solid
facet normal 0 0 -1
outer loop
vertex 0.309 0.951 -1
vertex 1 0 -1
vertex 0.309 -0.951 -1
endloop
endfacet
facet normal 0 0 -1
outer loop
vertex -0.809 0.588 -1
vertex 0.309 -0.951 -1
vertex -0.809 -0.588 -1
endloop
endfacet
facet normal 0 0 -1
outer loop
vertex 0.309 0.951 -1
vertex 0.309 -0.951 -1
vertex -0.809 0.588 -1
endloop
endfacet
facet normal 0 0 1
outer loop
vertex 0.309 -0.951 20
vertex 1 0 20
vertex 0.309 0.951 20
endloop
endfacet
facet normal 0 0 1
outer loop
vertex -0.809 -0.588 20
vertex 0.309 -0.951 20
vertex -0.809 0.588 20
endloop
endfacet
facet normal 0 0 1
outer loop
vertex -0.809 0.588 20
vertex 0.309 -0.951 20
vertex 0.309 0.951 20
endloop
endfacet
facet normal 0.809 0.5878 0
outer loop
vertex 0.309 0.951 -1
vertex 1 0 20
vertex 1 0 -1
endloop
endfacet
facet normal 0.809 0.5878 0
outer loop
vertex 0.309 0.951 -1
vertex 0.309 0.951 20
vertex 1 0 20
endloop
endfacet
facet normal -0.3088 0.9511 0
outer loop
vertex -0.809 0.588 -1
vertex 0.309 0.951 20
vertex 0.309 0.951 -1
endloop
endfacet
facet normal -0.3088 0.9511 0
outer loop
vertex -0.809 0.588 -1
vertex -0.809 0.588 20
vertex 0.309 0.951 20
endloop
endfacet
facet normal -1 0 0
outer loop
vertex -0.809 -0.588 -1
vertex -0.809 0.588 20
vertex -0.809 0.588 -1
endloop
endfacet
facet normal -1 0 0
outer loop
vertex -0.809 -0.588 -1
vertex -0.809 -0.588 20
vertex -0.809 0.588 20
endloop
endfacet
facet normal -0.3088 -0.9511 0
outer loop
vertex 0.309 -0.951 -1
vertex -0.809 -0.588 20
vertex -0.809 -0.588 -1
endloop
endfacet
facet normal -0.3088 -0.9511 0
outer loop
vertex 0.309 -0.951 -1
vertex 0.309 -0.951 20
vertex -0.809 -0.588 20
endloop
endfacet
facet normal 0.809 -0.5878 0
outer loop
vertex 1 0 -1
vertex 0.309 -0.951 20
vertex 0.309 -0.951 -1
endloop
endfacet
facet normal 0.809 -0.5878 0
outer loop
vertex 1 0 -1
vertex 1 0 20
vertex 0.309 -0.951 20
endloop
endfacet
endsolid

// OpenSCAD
// Unit of length: Unit.MM
translate(v = [0.0, 0.0, -1.0])
{
   linear_extrude(height = 21.0, center = false, twist = 0.0, scale = 1.0)
   {
      circle(d = 2.0);
   }
}
